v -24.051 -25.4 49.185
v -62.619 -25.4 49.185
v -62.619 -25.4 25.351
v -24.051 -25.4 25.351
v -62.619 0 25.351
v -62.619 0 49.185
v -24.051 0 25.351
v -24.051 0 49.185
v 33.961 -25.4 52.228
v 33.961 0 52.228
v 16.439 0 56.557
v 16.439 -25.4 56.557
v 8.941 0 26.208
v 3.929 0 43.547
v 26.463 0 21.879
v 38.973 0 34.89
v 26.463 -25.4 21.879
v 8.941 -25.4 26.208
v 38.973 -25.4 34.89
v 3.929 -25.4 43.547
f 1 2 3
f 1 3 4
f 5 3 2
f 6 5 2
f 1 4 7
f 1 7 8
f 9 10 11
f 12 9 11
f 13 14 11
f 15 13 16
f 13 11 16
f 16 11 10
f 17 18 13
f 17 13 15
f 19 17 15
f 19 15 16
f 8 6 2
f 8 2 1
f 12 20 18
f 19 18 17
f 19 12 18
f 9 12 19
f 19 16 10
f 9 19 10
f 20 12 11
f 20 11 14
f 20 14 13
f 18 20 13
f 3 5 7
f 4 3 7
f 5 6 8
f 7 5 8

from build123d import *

# Parameters (mm, degrees)
F0_W     = 38.56829
F0_H     = 23.834334
F1_DEPTH = 25.4
F3_DEPTH = 25.4


with BuildPart() as f1:
    # F0 (on Front) → F1 (new body)
    with BuildSketch(Plane.XZ):
        with Locations((-43.335161, 37.268228)):
            Rectangle(F0_W, F0_H)
    extrude(amount=F1_DEPTH)


with BuildPart() as f3:
    # F2 (on Front) → F3 (new body)
    with BuildSketch(Plane.XZ):
        Polygon((26.463141, 21.879438), (38.972924, 34.889609), (33.960678, 52.228485), (16.438647, 56.55719), (3.928863, 43.547019), (8.94111, 26.208143), align=None)
    extrude(amount=F3_DEPTH)


solid = Compound([f1.part, f3.part])
